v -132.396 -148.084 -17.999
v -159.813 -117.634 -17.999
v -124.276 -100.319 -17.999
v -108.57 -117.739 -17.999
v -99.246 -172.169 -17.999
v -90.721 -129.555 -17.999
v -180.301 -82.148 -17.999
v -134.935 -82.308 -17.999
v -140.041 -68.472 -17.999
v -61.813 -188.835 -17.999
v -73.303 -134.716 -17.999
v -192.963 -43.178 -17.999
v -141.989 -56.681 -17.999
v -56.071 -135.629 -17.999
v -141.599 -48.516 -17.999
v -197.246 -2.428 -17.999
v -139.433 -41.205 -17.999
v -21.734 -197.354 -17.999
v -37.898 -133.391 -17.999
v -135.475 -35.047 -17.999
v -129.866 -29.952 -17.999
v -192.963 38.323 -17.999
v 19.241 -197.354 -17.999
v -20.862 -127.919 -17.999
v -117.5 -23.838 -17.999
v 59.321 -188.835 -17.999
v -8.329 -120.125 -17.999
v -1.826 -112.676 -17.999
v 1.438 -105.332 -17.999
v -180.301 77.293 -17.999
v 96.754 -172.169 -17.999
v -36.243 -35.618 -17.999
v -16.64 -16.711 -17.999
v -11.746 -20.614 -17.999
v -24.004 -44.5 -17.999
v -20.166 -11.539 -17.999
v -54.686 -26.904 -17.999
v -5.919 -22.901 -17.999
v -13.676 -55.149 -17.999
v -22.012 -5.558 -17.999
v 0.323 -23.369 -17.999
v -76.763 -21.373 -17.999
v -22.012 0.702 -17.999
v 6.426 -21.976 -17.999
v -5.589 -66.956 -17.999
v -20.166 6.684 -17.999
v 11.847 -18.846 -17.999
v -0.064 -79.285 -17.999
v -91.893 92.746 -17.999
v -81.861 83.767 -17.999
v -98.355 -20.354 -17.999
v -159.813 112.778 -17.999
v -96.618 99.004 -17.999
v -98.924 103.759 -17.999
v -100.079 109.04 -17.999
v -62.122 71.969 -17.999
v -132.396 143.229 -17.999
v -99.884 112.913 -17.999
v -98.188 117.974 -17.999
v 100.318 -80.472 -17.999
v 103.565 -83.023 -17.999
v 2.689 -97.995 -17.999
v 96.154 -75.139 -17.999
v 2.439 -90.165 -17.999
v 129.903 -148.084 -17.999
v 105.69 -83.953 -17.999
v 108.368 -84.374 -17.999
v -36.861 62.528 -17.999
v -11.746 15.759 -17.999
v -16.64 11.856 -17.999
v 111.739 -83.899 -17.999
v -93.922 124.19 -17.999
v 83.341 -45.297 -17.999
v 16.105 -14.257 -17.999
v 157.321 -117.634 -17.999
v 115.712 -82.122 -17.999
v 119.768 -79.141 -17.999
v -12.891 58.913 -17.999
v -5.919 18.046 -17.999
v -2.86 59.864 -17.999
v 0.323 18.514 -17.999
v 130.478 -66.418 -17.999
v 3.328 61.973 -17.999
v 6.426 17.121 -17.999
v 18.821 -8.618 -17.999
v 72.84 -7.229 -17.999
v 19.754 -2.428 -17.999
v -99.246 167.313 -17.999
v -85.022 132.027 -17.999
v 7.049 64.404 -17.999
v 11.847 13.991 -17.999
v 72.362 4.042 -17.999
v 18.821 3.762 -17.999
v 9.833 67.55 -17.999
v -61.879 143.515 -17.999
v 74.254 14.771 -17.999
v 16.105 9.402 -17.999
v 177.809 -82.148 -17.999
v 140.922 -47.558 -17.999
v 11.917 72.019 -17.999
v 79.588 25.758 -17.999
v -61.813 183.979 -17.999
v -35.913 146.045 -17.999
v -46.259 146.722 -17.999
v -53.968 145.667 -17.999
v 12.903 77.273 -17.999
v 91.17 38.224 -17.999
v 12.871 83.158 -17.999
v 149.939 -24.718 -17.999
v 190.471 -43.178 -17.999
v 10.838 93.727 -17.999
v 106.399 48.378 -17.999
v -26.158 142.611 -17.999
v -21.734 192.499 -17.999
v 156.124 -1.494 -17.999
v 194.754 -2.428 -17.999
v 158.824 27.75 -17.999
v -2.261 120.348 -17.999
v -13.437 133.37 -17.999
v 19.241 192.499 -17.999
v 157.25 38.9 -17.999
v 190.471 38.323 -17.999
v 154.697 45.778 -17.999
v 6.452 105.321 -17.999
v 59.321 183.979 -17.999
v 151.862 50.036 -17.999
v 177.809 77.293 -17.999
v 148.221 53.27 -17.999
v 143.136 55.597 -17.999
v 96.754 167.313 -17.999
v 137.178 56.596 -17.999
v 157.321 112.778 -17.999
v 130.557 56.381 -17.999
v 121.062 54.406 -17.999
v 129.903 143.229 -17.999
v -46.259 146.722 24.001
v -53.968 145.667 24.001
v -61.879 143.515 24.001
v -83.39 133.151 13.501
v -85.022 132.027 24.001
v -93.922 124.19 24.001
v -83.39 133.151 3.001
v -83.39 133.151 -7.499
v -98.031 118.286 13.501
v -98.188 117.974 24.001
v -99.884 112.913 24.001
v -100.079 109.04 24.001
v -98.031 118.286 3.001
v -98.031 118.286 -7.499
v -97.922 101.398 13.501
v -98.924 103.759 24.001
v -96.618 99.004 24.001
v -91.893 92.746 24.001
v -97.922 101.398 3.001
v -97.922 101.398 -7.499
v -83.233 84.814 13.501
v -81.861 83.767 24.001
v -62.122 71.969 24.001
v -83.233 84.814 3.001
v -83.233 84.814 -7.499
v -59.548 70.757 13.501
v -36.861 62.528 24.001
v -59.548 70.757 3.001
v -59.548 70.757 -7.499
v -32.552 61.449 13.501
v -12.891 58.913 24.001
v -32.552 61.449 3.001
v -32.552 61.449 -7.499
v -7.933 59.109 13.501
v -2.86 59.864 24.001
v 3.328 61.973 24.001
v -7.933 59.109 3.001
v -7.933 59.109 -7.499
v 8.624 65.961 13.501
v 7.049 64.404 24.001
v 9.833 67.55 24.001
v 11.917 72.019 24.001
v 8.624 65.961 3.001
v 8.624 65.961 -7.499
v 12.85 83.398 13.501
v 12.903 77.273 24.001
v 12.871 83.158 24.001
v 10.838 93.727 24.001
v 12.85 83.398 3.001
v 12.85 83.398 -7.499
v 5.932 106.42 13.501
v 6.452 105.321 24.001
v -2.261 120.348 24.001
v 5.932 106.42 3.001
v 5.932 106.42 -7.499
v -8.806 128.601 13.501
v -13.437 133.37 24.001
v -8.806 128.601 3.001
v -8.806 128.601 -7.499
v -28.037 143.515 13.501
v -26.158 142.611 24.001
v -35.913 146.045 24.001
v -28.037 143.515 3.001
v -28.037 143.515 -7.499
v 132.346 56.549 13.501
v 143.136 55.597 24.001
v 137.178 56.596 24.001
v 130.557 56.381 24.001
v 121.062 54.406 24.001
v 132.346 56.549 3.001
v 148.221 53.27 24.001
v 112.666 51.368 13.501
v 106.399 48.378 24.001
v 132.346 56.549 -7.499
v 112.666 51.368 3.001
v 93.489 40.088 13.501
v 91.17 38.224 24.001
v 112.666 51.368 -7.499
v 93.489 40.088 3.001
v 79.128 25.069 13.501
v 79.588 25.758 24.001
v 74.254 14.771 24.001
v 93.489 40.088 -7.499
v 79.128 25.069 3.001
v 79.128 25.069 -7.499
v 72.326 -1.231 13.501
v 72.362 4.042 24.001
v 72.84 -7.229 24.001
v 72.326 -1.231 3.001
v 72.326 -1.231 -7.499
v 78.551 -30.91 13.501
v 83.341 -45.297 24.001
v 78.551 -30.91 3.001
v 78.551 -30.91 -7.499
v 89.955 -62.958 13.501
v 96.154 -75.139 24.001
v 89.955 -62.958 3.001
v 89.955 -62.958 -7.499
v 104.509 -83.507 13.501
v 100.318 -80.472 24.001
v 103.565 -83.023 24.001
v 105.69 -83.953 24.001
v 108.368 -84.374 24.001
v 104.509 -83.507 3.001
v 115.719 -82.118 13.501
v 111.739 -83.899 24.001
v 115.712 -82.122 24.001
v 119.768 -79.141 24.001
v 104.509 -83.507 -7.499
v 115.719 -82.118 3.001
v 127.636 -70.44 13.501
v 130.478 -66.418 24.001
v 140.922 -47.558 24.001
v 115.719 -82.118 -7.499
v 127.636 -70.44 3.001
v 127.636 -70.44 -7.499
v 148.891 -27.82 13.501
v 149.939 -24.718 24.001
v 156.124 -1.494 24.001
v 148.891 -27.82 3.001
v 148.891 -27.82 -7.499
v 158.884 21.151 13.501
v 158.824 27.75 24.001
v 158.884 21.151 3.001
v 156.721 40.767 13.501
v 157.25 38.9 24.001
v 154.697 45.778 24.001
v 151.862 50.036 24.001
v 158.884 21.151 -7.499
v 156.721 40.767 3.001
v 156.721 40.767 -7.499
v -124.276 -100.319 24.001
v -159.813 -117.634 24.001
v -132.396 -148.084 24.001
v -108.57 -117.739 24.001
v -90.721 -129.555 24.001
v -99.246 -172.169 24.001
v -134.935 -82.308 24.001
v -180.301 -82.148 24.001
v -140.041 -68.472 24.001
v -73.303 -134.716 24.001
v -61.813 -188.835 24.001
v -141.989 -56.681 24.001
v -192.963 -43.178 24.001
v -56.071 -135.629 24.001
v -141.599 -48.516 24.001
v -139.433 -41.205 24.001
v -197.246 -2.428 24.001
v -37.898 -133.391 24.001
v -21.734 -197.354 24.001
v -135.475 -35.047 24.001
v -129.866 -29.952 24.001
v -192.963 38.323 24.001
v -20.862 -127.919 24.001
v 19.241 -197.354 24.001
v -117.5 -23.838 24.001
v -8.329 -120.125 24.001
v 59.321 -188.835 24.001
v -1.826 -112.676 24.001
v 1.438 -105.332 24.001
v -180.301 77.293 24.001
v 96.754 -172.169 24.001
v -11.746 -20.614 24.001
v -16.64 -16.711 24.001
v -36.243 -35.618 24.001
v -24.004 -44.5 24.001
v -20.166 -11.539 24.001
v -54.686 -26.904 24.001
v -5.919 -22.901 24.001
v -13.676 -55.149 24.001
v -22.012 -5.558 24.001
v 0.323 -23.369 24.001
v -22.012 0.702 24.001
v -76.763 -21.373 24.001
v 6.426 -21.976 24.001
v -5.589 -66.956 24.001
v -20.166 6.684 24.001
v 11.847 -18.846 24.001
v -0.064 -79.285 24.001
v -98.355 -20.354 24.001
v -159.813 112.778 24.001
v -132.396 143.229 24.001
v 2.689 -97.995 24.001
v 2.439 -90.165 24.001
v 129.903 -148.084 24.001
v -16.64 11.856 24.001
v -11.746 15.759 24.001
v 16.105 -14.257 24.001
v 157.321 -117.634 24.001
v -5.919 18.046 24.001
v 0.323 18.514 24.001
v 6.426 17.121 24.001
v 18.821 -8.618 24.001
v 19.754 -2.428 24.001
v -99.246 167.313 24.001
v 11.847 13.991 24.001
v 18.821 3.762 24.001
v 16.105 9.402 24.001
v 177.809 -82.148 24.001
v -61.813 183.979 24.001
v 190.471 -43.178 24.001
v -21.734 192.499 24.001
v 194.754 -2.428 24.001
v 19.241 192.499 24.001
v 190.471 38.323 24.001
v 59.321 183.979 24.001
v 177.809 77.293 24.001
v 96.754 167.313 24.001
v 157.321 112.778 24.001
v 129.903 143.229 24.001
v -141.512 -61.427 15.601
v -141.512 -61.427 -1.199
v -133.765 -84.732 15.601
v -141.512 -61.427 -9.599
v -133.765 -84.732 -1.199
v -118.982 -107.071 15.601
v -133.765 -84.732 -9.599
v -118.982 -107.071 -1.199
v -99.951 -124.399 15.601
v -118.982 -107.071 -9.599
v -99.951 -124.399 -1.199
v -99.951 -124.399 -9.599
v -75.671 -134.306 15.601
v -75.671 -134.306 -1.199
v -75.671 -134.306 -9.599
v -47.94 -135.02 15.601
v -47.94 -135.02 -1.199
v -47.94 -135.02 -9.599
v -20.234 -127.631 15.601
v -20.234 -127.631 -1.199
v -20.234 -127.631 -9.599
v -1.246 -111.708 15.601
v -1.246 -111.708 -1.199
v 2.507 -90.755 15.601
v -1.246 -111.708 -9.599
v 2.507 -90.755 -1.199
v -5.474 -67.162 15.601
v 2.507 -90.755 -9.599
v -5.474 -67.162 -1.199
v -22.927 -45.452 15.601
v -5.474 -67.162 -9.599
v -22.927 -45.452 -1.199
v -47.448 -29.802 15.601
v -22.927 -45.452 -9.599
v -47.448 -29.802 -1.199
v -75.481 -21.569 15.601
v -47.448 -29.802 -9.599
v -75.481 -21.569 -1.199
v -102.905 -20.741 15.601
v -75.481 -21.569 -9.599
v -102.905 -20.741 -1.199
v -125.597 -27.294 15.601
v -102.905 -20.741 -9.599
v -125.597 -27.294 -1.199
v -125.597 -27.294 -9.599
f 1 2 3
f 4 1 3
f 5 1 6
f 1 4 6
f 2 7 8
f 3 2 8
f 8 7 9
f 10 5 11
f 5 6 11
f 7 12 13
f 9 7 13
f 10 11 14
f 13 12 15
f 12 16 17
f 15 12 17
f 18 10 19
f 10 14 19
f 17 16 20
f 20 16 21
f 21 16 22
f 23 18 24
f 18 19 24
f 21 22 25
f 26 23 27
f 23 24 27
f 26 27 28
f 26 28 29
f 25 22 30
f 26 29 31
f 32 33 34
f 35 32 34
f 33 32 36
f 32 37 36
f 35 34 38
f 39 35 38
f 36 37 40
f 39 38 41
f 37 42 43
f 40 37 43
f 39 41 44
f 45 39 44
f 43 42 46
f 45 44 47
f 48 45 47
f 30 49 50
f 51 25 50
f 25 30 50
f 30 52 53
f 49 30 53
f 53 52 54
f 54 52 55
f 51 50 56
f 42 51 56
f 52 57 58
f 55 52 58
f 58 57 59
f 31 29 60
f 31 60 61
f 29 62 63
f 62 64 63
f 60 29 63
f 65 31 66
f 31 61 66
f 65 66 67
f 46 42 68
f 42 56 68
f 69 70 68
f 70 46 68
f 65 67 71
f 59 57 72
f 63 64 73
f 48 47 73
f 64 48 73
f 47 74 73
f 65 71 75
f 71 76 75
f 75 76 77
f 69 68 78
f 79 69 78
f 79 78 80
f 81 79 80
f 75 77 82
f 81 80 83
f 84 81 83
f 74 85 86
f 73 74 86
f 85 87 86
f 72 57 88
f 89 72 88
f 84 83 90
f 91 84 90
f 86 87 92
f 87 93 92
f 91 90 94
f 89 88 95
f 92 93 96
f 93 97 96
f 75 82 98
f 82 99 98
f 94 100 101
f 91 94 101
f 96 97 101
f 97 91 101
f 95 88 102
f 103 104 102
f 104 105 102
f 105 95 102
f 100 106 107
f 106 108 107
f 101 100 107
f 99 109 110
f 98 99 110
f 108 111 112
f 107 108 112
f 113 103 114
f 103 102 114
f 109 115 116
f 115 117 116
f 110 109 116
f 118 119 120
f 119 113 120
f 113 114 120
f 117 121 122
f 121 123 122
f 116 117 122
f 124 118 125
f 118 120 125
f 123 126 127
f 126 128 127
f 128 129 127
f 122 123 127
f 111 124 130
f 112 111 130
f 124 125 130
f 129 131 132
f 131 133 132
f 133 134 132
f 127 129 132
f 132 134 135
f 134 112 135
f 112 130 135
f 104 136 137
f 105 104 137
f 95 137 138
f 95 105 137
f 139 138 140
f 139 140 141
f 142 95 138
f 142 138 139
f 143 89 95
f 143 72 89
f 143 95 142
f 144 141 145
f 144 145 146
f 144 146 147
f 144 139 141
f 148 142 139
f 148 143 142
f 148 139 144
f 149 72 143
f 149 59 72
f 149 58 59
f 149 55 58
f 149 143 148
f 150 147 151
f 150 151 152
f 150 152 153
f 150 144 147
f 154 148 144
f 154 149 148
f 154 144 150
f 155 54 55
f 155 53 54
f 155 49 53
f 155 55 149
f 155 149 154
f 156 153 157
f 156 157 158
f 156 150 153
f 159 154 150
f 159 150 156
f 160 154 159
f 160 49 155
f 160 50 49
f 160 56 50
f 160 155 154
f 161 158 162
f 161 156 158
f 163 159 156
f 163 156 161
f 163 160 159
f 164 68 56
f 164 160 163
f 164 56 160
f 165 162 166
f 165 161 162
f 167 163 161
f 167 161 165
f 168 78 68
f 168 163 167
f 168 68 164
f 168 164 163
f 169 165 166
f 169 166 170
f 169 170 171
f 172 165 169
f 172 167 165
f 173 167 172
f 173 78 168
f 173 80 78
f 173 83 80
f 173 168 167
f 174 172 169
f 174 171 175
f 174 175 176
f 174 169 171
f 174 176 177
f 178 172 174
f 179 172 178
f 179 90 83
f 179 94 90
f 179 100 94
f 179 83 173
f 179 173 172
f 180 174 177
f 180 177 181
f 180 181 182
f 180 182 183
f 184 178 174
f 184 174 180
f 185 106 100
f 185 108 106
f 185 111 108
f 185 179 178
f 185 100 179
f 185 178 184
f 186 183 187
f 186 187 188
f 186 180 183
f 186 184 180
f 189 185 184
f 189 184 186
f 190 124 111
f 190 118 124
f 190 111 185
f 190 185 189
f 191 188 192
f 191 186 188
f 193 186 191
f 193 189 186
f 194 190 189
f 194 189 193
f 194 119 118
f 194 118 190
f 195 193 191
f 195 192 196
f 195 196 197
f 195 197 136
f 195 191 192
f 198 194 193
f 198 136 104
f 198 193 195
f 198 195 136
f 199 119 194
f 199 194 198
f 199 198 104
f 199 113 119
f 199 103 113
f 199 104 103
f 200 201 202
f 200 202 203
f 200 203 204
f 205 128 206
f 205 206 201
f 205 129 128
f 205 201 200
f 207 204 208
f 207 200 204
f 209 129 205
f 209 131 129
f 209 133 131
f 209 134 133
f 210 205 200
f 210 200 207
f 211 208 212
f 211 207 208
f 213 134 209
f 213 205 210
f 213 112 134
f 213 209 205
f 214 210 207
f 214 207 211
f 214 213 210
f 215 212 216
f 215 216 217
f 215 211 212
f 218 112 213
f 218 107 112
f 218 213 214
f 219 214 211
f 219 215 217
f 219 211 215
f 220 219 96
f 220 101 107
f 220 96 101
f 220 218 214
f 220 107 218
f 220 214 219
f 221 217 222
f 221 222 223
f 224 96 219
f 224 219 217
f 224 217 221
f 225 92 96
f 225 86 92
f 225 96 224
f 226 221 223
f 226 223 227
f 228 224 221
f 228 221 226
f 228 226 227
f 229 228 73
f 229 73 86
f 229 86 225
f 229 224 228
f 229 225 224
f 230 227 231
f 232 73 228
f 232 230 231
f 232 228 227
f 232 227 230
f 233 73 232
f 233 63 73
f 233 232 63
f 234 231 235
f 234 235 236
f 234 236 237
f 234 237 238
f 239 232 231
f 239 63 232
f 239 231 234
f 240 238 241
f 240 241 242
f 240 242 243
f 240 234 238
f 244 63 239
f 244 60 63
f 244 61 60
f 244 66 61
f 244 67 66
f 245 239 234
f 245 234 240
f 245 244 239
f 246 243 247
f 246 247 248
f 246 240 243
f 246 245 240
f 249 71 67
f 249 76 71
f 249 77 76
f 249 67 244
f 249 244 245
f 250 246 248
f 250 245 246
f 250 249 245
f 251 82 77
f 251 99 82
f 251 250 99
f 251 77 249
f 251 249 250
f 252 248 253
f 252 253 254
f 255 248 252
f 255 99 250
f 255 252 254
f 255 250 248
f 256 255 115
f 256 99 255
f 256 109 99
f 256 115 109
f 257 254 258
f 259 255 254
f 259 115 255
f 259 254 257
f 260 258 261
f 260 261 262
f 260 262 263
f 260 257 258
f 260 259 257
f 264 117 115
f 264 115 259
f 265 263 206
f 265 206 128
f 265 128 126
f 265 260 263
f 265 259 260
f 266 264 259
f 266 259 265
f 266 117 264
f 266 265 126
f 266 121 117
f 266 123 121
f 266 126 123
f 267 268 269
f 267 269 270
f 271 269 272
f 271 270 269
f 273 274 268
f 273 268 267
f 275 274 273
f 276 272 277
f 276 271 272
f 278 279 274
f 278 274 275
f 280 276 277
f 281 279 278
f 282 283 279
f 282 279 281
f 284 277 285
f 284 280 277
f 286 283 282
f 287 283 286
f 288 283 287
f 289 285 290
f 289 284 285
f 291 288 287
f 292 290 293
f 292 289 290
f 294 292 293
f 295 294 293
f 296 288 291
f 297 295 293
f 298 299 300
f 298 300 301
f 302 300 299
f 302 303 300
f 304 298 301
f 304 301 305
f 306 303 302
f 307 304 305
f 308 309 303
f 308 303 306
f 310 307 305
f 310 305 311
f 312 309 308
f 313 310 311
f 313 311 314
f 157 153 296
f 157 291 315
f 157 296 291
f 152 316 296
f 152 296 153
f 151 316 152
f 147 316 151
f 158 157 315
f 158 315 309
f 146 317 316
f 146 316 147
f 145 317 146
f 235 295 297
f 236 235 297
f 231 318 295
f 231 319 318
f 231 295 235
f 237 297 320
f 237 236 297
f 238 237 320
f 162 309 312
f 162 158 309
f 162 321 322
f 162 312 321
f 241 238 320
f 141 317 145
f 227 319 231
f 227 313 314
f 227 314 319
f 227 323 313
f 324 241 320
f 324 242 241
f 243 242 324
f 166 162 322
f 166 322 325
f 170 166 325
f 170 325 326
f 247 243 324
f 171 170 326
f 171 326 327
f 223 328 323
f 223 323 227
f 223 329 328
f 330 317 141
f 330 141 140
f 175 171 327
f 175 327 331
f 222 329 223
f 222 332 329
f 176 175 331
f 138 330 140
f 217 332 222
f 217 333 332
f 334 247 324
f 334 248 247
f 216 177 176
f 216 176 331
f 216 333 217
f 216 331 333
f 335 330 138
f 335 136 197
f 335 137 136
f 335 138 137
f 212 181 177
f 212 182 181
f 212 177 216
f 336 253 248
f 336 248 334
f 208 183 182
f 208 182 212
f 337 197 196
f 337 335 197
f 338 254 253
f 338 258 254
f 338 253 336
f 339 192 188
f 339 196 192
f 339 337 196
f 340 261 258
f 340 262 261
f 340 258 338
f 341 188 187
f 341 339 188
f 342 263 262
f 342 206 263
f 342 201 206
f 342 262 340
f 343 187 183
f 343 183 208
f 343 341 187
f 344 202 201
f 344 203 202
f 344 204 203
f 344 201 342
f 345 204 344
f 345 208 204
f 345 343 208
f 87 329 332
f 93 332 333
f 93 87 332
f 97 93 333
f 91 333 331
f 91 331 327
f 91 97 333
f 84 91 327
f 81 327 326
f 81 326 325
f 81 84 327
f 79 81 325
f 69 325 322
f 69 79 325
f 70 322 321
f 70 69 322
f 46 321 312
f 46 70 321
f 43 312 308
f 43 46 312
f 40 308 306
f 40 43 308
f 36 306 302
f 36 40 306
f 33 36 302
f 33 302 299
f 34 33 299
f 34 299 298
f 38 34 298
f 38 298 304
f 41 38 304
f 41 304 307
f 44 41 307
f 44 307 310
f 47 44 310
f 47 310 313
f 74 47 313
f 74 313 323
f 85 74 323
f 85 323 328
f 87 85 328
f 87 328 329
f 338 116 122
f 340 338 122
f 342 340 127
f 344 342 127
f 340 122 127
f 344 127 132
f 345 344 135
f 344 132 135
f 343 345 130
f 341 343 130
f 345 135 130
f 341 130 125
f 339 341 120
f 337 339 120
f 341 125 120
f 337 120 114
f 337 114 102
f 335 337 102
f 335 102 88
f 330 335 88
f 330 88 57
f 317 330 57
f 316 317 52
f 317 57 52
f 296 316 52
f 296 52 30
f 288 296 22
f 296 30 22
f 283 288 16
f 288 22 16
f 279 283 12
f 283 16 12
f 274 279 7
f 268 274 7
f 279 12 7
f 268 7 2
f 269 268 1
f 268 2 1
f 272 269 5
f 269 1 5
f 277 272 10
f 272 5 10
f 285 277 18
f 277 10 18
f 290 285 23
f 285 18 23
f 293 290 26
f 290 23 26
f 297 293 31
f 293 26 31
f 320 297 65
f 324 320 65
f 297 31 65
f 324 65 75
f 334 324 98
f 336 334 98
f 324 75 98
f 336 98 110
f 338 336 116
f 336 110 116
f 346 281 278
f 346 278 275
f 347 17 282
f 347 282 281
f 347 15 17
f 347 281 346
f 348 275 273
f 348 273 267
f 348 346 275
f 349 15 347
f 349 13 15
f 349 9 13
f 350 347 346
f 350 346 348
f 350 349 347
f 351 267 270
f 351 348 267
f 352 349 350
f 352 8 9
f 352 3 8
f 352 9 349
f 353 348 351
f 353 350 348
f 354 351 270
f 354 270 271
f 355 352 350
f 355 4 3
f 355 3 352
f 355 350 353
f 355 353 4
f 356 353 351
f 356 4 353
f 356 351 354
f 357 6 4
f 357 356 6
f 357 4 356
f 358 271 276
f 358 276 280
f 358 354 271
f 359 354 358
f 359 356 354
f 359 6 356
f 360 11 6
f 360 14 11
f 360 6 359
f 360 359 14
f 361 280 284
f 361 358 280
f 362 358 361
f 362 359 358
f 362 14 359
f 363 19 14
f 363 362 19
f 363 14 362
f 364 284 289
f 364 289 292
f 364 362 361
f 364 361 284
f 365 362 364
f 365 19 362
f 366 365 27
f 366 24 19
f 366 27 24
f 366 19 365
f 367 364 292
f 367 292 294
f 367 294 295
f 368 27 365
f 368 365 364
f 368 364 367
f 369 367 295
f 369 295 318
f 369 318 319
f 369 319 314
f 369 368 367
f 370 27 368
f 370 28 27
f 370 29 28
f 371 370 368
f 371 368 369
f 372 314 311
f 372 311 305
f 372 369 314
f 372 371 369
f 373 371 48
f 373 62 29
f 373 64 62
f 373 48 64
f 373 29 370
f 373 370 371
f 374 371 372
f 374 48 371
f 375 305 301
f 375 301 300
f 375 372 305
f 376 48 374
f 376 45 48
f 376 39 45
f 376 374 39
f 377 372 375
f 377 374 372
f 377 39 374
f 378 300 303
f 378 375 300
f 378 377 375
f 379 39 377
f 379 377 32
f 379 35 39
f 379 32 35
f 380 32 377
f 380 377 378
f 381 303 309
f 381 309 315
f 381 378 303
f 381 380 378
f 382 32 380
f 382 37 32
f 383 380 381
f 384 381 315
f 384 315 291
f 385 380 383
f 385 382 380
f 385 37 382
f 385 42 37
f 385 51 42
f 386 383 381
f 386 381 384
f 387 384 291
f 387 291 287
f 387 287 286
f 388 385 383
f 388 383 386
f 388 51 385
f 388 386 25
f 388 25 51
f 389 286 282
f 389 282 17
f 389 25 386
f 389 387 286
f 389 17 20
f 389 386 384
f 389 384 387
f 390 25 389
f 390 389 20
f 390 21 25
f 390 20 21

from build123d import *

# Parameters (mm, degrees)
CROQUIS4_R              = 28
CROQUIS4_R_2            = 3
SALIENTE_EXTRUIR4_DEPTH = 6
ESCALA1_OUTLINE_R       = 3
ESCALA1_DEPTH           = 6
ESCALA1_START           = -17.999496841
ESCALA1_2_OUTLINE_R     = 196
ESCALA1_2_OUTLINE_R_2   = 21
ESCALA1_2_DEPTH         = 42


# Read off the part's stored shape, not the designer's step: Escala1
with BuildPart() as part:
    # Croquis4 → Saliente-Extruir4 (new body)
    with BuildSketch(Plane.XY):
        Circle(CROQUIS4_R)
        Circle(CROQUIS4_R_2, mode=Mode.SUBTRACT)
        with BuildLine():
            add(Edge.make_bspline(
                [(-8.661870504, 20.848920863), (-11.134345794, 20.034136118), (-20.297893872, 14.130888348), (8.217093964, 2.571162502), (-1.30222885, 21.85293415), (-6.958093307, 21.41038721), (-8.661870504, 20.848920863)],
                knots=[0, 0, 0, 0, 0.171198279, 0.582988164, 0.882027649, 1, 1, 1, 1], degree=3))
        make_face(mode=Mode.SUBTRACT)
        with BuildLine():
            add(Edge.make_bspline(
                [(-19.741007194, -5.539568345), (-21.249718651, -8.841074311), (-16.531516182, -17.452719956), (-7.778034095, -19.759488675), (3.221126904, -16.771647645), (-3.062506153, -1.512267892), (-17.915961418, -1.545829524), (-19.741007194, -5.539568345)],
                knots=[0, 0, 0, 0, 0.239927974, 0.343384518, 0.513257855, 0.709765884, 1, 1, 1, 1], degree=3))
        make_face(mode=Mode.SUBTRACT)
        with BuildLine():
            add(Edge.make_bspline(
                [(21.352517986, 7.956834532), (18.964775909, 9.536744657), (8.614824702, 4.736209176), (11.365159497, -4.210520436), (16.807060129, -19.490986174), (25.946827357, 4.916893174), (21.352517986, 7.956834532)],
                knots=[0, 0, 0, 0, 0.224446261, 0.423947928, 0.568137794, 1, 1, 1, 1], degree=3))
        make_face(mode=Mode.SUBTRACT)
    extrude(amount=SALIENTE_EXTRUIR4_DEPTH)

    # Escala1 outline → Escala1 (cut)
    with BuildSketch(Plane.XY):
        with BuildLine():
            add(Edge.make_bspline(
                [(17.000522152, 7.967507439), (14.840589963, 7.215803291), (9.089500341, 3.192108217), (11.365159497, -4.210520436), (14.550664807, -13.155190328), (17.331175474, -11.190725846), (18.484727449, -9.617464952)],
                knots=[0.098053943, 0.098053943, 0.098053943, 0.098053943, 0.224446261, 0.423947928, 0.568137794, 0.678429294, 0.678429294, 0.678429294, 0.678429294], degree=3))
            ThreePointArc((17.000522152, 7.967507439), (9.434064569, 15.653634005), (-0.949635508, 18.57024071))
            add(Edge.make_bspline(
                [(-13.643682988, 14.522281267), (-11.296449172, 10.565883797), (5.297482073, 4.692739999), (1.478494793, 15.764375539), (-0.949635508, 18.57024071)],
                knots=[0.227878432, 0.227878432, 0.227878432, 0.227878432, 0.582988164, 0.803352892, 0.803352892, 0.803352892, 0.803352892], degree=3))
            ThreePointArc((-13.643682988, 14.522281267), (-13.860654258, -19.216764164), (18.484727449, -9.617464952))
        make_face()
        with BuildLine():
            add(Edge.make_bspline(
                [(-19.741007194, -5.539568345), (-21.249718651, -8.841074311), (-16.531516182, -17.452719956), (-7.778034095, -19.759488675), (3.221126904, -16.771647645), (-3.062506153, -1.512267892), (-17.915961418, -1.545829524), (-19.741007194, -5.539568345)],
                knots=[0, 0, 0, 0, 0.239927974, 0.343384518, 0.513257855, 0.709765884, 1, 1, 1, 1], degree=3))
        make_face(mode=Mode.SUBTRACT)
        Circle(ESCALA1_OUTLINE_R, mode=Mode.SUBTRACT)
    extrude(amount=ESCALA1_DEPTH, mode=Mode.SUBTRACT)

    # Escala1 2 outline → Escala1 2 (add)
    with BuildSketch(Plane.XY.offset(ESCALA1_START)):
        with Locations((-1.246131437, -2.427666094)):
            Circle(ESCALA1_2_OUTLINE_R)
        with BuildLine():
            add(Edge.make_bspline(
                [(-139.433181797, -41.204644512), (-149.994161996, -64.315186271), (-116.966744714, -124.596705788), (-55.692370104, -140.74408682), (21.301756893, -119.829199607), (-22.683674511, -13.013541342), (-126.657861367, -13.248472762), (-139.433181797, -41.204644512)],
                knots=[0, 0, 0, 0, 0.239927974, 0.343384518, 0.513257855, 0.709765884, 1, 1, 1, 1], degree=3))
        make_face(mode=Mode.SUBTRACT)
        with BuildLine():
            add(Edge.make_bspline(
                [(148.221494462, 53.270175632), (131.507299926, 64.329546503), (59.057641477, 30.725798138), (78.309985044, -31.901309148), (116.403289469, -138.864569314), (180.381660063, 31.990586127), (148.221494462, 53.270175632)],
                knots=[0, 0, 0, 0, 0.224446261, 0.423947928, 0.568137794, 1, 1, 1, 1], degree=3))
        make_face(mode=Mode.SUBTRACT)
        with BuildLine():
            add(Edge.make_bspline(
                [(-61.879224962, 143.514779949), (-79.186551993, 137.811286735), (-143.331388538, 96.488552344), (56.273526308, 15.570471419), (-10.361733388, 150.542872956), (-49.95278459, 147.445044375), (-61.879224962, 143.514779949)],
                knots=[0, 0, 0, 0, 0.171198279, 0.582988164, 0.882027649, 1, 1, 1, 1], degree=3))
        make_face(mode=Mode.SUBTRACT)
        with Locations((-1.246131437, -2.427666094)):
            Circle(ESCALA1_2_OUTLINE_R_2, mode=Mode.SUBTRACT)
    extrude(amount=ESCALA1_2_DEPTH)


solid = part.part
